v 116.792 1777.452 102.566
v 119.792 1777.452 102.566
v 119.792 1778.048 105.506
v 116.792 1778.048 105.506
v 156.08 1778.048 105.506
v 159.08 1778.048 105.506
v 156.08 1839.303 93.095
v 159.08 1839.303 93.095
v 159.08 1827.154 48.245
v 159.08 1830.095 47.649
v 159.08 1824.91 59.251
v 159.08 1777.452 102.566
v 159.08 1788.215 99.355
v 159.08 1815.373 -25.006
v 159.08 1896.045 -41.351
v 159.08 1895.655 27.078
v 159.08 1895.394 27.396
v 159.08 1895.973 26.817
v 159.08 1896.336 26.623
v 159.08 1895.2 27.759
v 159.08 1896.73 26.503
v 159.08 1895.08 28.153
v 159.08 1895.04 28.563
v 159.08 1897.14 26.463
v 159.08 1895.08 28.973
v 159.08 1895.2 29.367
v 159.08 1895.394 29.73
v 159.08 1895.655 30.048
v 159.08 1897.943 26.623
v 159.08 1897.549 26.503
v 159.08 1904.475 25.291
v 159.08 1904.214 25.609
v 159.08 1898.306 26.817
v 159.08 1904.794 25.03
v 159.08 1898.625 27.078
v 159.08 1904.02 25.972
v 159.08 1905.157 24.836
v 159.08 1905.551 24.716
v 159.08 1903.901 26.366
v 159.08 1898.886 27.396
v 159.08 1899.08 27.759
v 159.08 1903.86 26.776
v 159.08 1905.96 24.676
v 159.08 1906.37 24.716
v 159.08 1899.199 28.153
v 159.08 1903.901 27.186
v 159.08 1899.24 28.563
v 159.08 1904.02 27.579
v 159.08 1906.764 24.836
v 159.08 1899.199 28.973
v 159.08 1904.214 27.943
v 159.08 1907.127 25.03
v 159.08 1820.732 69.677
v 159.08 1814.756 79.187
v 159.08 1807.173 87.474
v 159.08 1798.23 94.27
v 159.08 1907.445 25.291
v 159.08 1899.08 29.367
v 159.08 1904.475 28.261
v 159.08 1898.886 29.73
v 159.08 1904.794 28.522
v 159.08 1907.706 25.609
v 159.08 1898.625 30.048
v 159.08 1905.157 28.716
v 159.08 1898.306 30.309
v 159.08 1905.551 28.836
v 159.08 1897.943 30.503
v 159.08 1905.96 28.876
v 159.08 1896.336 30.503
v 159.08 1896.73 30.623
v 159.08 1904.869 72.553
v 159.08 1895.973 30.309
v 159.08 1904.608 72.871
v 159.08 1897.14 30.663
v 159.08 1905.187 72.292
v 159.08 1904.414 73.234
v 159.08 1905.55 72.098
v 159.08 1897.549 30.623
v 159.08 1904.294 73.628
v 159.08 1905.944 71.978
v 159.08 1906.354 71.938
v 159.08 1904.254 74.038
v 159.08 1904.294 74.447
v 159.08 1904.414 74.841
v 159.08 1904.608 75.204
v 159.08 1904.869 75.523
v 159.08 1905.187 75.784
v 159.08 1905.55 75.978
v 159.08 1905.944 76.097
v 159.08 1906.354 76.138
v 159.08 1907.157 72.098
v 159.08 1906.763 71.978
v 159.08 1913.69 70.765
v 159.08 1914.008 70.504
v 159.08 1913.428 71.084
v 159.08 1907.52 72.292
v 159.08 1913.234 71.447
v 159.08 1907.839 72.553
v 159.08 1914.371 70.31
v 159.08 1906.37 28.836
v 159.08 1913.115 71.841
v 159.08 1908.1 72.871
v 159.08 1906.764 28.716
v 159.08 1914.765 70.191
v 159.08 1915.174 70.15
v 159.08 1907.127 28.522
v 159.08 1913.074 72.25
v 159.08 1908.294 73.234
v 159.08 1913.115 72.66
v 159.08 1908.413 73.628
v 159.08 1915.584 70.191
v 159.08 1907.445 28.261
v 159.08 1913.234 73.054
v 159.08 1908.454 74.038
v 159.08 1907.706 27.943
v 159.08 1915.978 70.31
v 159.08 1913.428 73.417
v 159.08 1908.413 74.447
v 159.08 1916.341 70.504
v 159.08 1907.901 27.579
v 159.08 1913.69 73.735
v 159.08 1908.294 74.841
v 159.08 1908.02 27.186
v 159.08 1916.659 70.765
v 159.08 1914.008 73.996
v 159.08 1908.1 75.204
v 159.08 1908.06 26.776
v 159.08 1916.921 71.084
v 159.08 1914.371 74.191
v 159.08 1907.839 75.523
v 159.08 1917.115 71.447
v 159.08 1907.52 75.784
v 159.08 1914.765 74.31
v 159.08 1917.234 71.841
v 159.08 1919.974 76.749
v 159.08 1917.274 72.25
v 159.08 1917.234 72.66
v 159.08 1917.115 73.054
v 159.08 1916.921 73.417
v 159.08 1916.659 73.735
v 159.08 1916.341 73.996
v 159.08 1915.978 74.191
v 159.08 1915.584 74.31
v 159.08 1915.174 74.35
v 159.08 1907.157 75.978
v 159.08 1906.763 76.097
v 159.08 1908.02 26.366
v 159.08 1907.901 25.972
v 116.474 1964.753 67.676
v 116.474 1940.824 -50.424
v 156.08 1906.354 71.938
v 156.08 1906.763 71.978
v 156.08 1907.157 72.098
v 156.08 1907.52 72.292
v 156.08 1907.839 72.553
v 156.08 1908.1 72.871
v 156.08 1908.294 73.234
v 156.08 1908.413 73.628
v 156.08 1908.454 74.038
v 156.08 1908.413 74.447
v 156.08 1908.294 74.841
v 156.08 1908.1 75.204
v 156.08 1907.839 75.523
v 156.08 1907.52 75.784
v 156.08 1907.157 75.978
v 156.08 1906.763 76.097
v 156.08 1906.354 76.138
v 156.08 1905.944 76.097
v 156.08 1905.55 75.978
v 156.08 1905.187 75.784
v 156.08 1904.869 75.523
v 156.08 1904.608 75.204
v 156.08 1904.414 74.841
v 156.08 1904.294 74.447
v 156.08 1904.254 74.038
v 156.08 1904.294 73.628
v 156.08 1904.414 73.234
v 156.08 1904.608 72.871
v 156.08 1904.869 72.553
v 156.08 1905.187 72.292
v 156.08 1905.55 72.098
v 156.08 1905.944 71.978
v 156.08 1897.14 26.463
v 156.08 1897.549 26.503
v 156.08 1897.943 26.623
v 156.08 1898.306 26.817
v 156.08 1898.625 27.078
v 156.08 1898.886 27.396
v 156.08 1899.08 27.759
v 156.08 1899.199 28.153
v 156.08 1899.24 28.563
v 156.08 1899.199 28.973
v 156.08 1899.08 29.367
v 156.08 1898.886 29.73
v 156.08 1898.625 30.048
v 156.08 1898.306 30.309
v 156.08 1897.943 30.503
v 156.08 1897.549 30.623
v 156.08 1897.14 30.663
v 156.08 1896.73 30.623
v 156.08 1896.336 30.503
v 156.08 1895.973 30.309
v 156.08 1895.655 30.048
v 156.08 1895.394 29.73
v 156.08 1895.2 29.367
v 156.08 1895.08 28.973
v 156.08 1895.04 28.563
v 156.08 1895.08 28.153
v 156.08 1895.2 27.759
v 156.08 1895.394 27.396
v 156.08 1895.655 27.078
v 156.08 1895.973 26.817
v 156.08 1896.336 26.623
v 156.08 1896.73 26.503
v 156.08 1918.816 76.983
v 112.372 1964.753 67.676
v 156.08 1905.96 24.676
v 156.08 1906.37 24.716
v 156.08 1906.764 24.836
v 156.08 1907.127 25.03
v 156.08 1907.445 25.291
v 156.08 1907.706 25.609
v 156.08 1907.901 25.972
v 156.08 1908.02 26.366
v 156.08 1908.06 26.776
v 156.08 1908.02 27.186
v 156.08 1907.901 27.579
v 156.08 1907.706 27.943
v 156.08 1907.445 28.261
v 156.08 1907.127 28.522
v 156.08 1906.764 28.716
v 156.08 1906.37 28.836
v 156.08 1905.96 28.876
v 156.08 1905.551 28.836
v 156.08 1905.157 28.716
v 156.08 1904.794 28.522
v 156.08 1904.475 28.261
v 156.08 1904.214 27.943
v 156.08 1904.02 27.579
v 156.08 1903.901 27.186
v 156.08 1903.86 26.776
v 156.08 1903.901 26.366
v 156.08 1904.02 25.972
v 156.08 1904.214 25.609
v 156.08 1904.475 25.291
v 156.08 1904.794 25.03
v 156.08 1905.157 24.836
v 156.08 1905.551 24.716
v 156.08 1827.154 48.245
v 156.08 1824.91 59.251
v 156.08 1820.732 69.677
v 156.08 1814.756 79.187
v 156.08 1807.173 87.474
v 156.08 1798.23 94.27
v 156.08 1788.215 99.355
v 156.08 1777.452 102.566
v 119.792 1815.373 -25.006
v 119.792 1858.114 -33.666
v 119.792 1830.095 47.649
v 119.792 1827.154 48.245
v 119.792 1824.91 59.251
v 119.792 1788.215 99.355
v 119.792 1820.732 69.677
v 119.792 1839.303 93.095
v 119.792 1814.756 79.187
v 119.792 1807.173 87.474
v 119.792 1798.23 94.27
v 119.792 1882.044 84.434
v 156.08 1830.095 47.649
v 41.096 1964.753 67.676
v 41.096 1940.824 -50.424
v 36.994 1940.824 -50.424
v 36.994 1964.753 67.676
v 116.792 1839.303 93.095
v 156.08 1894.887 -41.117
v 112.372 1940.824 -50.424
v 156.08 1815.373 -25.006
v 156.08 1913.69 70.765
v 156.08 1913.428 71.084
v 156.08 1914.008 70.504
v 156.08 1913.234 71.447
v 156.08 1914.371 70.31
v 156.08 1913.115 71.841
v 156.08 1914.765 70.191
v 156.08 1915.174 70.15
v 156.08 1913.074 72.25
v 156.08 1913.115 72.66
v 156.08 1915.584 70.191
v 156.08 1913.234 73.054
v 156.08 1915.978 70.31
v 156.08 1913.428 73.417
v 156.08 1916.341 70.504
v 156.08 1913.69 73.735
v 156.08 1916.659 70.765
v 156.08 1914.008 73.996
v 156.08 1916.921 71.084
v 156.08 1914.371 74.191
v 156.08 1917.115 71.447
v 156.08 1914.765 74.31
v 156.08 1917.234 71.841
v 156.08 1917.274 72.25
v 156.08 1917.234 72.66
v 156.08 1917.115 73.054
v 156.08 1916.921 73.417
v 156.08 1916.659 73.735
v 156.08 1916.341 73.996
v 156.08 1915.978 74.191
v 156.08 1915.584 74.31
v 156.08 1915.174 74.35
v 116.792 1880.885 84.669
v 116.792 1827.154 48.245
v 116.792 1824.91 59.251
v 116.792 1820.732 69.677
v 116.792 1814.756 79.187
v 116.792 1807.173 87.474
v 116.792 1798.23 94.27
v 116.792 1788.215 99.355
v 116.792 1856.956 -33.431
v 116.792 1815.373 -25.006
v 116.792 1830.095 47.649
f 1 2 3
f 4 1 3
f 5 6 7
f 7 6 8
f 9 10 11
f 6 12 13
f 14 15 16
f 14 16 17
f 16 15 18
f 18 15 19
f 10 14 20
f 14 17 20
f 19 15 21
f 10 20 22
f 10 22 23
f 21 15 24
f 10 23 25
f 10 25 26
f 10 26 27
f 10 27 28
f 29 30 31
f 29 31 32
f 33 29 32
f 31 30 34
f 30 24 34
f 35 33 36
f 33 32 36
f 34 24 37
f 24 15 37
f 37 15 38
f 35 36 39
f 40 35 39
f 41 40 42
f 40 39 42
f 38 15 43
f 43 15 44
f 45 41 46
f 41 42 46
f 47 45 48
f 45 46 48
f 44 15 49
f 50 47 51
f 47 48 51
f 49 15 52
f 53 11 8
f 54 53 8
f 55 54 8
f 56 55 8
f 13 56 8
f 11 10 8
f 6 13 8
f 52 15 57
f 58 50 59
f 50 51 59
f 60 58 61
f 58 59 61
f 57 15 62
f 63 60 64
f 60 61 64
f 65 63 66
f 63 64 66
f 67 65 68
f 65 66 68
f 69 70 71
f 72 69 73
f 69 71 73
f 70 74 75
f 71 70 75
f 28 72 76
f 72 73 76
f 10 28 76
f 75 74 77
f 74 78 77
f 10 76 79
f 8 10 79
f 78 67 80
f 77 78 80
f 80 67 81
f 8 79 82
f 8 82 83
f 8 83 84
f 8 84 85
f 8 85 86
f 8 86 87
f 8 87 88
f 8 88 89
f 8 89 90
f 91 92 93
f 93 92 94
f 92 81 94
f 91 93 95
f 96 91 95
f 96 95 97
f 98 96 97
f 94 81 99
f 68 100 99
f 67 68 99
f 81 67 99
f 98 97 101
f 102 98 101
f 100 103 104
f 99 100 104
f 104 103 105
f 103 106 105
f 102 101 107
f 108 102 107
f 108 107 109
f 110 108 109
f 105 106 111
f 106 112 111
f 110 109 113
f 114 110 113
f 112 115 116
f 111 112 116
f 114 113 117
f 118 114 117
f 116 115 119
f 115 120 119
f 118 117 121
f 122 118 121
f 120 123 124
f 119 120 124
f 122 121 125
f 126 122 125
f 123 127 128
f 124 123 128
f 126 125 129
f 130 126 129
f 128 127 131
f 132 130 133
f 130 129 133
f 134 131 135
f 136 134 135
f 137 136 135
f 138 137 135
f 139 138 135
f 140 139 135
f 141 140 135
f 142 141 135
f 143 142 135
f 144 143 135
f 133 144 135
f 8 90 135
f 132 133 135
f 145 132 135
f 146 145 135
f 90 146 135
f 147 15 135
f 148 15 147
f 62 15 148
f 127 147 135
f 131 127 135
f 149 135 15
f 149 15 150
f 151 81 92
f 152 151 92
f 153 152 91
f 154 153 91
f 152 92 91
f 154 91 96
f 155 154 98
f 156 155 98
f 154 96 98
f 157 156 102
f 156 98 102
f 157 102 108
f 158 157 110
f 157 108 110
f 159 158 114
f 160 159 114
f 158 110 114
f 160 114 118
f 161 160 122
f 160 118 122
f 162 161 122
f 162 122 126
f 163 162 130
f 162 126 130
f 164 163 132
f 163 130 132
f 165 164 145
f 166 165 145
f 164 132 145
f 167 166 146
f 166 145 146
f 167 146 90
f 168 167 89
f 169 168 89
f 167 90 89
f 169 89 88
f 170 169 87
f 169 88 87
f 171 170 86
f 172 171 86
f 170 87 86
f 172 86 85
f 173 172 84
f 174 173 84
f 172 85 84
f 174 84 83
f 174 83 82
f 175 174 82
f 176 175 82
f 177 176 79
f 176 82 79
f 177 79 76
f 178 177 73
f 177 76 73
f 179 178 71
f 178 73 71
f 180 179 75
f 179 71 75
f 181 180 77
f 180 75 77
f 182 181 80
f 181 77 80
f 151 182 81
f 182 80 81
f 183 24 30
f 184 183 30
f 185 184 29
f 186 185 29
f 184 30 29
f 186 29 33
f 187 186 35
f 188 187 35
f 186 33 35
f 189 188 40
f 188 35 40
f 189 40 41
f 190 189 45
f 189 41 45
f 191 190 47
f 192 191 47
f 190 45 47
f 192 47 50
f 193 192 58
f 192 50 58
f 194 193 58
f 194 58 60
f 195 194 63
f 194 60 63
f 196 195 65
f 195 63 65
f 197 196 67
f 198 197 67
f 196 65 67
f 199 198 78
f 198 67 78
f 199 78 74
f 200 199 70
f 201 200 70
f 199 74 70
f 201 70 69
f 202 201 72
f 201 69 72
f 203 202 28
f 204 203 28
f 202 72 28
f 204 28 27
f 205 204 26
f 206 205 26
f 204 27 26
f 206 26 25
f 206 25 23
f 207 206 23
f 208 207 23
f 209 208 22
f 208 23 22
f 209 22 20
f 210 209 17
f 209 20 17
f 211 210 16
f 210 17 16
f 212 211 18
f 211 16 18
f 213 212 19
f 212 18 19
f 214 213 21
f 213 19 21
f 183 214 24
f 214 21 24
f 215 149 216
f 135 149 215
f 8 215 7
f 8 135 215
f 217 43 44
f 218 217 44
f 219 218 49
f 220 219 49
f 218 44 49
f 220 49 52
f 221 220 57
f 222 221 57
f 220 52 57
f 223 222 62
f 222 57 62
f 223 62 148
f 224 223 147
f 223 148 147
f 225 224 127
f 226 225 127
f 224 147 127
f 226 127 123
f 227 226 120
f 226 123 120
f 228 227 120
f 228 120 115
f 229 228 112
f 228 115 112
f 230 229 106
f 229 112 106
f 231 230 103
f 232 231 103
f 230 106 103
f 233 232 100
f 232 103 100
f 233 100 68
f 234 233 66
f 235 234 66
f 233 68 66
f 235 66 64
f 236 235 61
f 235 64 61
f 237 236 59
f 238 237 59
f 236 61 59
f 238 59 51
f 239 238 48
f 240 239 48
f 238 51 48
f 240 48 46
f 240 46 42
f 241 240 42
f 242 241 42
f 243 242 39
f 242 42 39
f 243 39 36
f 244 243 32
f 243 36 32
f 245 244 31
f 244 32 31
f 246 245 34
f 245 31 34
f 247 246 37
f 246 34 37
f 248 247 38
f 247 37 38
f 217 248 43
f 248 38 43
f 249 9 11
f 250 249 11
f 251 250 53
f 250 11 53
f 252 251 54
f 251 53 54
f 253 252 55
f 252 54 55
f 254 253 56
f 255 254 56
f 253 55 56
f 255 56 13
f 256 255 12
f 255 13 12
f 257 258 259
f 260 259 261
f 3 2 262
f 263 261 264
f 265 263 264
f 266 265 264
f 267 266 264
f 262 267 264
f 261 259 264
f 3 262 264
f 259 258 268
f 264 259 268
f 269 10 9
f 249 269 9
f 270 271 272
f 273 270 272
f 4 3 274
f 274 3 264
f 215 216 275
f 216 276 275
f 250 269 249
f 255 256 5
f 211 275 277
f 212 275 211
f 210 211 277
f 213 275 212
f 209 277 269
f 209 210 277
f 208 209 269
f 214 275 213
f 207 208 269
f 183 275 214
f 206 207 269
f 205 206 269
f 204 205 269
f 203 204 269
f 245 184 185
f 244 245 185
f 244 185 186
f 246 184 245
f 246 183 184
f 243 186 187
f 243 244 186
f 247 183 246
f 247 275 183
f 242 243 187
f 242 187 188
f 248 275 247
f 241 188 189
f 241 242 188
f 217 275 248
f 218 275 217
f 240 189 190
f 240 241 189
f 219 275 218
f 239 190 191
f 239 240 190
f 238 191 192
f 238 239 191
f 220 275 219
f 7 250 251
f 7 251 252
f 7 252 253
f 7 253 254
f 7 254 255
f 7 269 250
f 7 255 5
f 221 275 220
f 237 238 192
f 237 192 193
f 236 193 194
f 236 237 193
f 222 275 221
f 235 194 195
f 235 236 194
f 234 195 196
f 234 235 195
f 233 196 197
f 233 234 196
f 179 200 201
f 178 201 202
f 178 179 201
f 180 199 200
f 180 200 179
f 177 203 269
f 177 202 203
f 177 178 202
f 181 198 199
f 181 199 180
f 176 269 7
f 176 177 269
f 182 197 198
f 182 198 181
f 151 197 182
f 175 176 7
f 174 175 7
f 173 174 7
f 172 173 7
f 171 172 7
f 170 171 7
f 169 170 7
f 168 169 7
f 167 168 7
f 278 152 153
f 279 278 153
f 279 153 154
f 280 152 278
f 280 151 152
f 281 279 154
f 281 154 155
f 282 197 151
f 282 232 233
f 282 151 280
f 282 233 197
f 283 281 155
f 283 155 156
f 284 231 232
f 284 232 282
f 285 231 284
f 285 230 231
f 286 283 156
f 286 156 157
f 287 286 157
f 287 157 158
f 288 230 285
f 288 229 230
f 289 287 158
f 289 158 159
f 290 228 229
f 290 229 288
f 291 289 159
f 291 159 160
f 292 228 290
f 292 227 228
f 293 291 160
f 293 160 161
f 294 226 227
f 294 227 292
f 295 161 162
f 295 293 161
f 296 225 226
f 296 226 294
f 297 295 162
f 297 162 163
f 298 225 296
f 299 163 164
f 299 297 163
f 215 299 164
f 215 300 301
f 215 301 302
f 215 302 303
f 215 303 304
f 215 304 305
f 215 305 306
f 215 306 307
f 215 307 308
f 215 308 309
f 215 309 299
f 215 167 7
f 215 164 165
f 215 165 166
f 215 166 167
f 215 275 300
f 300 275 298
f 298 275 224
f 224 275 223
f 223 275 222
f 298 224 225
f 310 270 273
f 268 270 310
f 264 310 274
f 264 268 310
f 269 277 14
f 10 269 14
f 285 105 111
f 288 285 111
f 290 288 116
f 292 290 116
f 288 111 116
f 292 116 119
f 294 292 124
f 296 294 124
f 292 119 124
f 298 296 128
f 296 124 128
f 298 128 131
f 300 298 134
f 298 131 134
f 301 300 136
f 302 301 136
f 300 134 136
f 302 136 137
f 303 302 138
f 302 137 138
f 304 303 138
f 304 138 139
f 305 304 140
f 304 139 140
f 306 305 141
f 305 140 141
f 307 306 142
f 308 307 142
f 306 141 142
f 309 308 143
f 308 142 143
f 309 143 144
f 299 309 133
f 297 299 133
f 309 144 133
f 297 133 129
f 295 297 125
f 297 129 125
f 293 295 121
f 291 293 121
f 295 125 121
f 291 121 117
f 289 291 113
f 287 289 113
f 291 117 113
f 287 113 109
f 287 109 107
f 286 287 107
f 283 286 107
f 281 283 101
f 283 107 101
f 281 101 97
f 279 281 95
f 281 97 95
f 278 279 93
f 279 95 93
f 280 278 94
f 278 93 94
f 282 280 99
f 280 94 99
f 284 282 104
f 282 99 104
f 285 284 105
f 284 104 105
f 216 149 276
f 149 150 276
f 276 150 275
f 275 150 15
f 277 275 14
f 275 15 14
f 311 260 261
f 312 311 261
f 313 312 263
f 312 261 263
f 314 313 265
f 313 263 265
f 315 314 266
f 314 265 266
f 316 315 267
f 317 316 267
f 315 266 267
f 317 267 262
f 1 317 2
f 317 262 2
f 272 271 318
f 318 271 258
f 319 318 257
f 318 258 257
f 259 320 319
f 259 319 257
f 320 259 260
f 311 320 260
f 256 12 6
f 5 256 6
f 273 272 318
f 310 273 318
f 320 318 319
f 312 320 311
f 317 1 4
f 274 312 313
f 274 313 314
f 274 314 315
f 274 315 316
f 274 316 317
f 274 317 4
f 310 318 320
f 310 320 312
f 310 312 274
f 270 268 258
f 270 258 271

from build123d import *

# Parameters (mm, degrees)
BOSS_EXTRUDE1_DEPTH      = 55
BOSS_EXTRUDE1_DEPTH_BACK = 65.5
BOSS_EXTRUDE3_DEPTH      = 55
BOSS_EXTRUDE3_DEPTH_BACK = 65.5
BOSS_EXTRUDE5_DEPTH      = 3
BOSS_EXTRUDE6_DEPTH      = 3
SKETCH10_R               = 2.1
CUT_EXTRUDE1_DEPTH       = 3


with BuildPart() as part:
    # Sketch2 → Boss-Extrude1 (new body, two sides)
    with BuildSketch(Plane(origin=(0, 77.646629373, 383.211606662), x_dir=(0, 0.98008361, -0.198585292), z_dir=(0, -0.198585292, -0.98008361))) as boss_extrude1_sk:
        Polygon((1912.183265782, 36.994395038), (1826.61087511, 116.791940296), (1784.183265784, 116.791940296), (1784.183265784, 119.791940296), (1827.792606537, 119.791940296), (1912.183265782, 41.096377421), align=None)
    extrude(amount=BOSS_EXTRUDE1_DEPTH)
    extrude(boss_extrude1_sk.sketch, amount=-BOSS_EXTRUDE1_DEPTH_BACK)

    # Sketch8 → Boss-Extrude5 (add)
    with BuildSketch(Plane(origin=(119.791940296, 0, 0), x_dir=(0, 0, -1), z_dir=(1, 0, 0))):
        with BuildLine():
            Line((-93.094528353, 1839.302741325), (-47.64915541, 1830.094565037))
            Line((-47.64915541, 1830.094565037), (-48.244911285, 1827.154314208))
            ThreePointArc((-48.244911285, 1827.154314208), (-83.501130401, 1811.151044429), (-102.565858271, 1777.451759848))
            Line((-102.565858271, 1777.451759848), (-105.5061091, 1778.047515724))
            Line((-105.5061091, 1778.047515724), (-93.094528353, 1839.302741325))
        make_face()
    extrude(amount=-BOSS_EXTRUDE5_DEPTH)


with BuildPart() as body_2:
    # Sketch6 → Boss-Extrude3 (new body, two sides)
    with BuildSketch(Plane(origin=(0, 77.646629373, 383.211606662), x_dir=(0, 0.98008361, -0.198585292), z_dir=(0, -0.198585292, -0.98008361))) as boss_extrude3_sk:
        Polygon((1866.49410445, 159.080275109), (1912.183265782, 116.474442894), (1912.183265782, 112.37246051), (1865.312373023, 156.080275109), (1784.183265784, 156.080275109), (1784.183265784, 159.080275109), align=None)
    extrude(amount=BOSS_EXTRUDE3_DEPTH)
    extrude(boss_extrude3_sk.sketch, amount=-BOSS_EXTRUDE3_DEPTH_BACK)

    # Sketch9 → Boss-Extrude6 (add)
    with BuildSketch(Plane(origin=(159.080275109, 0, 0), x_dir=(0, 0, -1), z_dir=(1, 0, 0))):
        with BuildLine():
            Line((-93.094528353, 1839.302741325), (-47.64915541, 1830.094565037))
            Line((-47.64915541, 1830.094565037), (-48.244911285, 1827.154314208))
            ThreePointArc((-48.244911285, 1827.154314208), (-83.501130401, 1811.151044429), (-102.565858271, 1777.451759848))
            Line((-102.565858271, 1777.451759848), (-105.5061091, 1778.047515724))
            Line((-105.5061091, 1778.047515724), (-93.094528353, 1839.302741325))
        make_face()
    extrude(amount=-BOSS_EXTRUDE6_DEPTH)

    # Sketch10 → Cut-Extrude1 (cut)
    with BuildSketch(Plane(origin=(159.080275109, 0, 0), x_dir=(0, 0, -1), z_dir=(1, 0, 0))):
        with Locations((-28.563130495, 1897.139657439)):
            Circle(SKETCH10_R)
        with Locations((-26.775862867, 1905.960409926)):
            Circle(SKETCH10_R)
        with Locations((-72.250396343, 1915.174494743)):
            Circle(SKETCH10_R)
        with Locations((-74.03766397, 1906.353742257)):
            Circle(SKETCH10_R)
    extrude(amount=-CUT_EXTRUDE1_DEPTH, mode=Mode.SUBTRACT)


solid = Compound([part.part, body_2.part])
